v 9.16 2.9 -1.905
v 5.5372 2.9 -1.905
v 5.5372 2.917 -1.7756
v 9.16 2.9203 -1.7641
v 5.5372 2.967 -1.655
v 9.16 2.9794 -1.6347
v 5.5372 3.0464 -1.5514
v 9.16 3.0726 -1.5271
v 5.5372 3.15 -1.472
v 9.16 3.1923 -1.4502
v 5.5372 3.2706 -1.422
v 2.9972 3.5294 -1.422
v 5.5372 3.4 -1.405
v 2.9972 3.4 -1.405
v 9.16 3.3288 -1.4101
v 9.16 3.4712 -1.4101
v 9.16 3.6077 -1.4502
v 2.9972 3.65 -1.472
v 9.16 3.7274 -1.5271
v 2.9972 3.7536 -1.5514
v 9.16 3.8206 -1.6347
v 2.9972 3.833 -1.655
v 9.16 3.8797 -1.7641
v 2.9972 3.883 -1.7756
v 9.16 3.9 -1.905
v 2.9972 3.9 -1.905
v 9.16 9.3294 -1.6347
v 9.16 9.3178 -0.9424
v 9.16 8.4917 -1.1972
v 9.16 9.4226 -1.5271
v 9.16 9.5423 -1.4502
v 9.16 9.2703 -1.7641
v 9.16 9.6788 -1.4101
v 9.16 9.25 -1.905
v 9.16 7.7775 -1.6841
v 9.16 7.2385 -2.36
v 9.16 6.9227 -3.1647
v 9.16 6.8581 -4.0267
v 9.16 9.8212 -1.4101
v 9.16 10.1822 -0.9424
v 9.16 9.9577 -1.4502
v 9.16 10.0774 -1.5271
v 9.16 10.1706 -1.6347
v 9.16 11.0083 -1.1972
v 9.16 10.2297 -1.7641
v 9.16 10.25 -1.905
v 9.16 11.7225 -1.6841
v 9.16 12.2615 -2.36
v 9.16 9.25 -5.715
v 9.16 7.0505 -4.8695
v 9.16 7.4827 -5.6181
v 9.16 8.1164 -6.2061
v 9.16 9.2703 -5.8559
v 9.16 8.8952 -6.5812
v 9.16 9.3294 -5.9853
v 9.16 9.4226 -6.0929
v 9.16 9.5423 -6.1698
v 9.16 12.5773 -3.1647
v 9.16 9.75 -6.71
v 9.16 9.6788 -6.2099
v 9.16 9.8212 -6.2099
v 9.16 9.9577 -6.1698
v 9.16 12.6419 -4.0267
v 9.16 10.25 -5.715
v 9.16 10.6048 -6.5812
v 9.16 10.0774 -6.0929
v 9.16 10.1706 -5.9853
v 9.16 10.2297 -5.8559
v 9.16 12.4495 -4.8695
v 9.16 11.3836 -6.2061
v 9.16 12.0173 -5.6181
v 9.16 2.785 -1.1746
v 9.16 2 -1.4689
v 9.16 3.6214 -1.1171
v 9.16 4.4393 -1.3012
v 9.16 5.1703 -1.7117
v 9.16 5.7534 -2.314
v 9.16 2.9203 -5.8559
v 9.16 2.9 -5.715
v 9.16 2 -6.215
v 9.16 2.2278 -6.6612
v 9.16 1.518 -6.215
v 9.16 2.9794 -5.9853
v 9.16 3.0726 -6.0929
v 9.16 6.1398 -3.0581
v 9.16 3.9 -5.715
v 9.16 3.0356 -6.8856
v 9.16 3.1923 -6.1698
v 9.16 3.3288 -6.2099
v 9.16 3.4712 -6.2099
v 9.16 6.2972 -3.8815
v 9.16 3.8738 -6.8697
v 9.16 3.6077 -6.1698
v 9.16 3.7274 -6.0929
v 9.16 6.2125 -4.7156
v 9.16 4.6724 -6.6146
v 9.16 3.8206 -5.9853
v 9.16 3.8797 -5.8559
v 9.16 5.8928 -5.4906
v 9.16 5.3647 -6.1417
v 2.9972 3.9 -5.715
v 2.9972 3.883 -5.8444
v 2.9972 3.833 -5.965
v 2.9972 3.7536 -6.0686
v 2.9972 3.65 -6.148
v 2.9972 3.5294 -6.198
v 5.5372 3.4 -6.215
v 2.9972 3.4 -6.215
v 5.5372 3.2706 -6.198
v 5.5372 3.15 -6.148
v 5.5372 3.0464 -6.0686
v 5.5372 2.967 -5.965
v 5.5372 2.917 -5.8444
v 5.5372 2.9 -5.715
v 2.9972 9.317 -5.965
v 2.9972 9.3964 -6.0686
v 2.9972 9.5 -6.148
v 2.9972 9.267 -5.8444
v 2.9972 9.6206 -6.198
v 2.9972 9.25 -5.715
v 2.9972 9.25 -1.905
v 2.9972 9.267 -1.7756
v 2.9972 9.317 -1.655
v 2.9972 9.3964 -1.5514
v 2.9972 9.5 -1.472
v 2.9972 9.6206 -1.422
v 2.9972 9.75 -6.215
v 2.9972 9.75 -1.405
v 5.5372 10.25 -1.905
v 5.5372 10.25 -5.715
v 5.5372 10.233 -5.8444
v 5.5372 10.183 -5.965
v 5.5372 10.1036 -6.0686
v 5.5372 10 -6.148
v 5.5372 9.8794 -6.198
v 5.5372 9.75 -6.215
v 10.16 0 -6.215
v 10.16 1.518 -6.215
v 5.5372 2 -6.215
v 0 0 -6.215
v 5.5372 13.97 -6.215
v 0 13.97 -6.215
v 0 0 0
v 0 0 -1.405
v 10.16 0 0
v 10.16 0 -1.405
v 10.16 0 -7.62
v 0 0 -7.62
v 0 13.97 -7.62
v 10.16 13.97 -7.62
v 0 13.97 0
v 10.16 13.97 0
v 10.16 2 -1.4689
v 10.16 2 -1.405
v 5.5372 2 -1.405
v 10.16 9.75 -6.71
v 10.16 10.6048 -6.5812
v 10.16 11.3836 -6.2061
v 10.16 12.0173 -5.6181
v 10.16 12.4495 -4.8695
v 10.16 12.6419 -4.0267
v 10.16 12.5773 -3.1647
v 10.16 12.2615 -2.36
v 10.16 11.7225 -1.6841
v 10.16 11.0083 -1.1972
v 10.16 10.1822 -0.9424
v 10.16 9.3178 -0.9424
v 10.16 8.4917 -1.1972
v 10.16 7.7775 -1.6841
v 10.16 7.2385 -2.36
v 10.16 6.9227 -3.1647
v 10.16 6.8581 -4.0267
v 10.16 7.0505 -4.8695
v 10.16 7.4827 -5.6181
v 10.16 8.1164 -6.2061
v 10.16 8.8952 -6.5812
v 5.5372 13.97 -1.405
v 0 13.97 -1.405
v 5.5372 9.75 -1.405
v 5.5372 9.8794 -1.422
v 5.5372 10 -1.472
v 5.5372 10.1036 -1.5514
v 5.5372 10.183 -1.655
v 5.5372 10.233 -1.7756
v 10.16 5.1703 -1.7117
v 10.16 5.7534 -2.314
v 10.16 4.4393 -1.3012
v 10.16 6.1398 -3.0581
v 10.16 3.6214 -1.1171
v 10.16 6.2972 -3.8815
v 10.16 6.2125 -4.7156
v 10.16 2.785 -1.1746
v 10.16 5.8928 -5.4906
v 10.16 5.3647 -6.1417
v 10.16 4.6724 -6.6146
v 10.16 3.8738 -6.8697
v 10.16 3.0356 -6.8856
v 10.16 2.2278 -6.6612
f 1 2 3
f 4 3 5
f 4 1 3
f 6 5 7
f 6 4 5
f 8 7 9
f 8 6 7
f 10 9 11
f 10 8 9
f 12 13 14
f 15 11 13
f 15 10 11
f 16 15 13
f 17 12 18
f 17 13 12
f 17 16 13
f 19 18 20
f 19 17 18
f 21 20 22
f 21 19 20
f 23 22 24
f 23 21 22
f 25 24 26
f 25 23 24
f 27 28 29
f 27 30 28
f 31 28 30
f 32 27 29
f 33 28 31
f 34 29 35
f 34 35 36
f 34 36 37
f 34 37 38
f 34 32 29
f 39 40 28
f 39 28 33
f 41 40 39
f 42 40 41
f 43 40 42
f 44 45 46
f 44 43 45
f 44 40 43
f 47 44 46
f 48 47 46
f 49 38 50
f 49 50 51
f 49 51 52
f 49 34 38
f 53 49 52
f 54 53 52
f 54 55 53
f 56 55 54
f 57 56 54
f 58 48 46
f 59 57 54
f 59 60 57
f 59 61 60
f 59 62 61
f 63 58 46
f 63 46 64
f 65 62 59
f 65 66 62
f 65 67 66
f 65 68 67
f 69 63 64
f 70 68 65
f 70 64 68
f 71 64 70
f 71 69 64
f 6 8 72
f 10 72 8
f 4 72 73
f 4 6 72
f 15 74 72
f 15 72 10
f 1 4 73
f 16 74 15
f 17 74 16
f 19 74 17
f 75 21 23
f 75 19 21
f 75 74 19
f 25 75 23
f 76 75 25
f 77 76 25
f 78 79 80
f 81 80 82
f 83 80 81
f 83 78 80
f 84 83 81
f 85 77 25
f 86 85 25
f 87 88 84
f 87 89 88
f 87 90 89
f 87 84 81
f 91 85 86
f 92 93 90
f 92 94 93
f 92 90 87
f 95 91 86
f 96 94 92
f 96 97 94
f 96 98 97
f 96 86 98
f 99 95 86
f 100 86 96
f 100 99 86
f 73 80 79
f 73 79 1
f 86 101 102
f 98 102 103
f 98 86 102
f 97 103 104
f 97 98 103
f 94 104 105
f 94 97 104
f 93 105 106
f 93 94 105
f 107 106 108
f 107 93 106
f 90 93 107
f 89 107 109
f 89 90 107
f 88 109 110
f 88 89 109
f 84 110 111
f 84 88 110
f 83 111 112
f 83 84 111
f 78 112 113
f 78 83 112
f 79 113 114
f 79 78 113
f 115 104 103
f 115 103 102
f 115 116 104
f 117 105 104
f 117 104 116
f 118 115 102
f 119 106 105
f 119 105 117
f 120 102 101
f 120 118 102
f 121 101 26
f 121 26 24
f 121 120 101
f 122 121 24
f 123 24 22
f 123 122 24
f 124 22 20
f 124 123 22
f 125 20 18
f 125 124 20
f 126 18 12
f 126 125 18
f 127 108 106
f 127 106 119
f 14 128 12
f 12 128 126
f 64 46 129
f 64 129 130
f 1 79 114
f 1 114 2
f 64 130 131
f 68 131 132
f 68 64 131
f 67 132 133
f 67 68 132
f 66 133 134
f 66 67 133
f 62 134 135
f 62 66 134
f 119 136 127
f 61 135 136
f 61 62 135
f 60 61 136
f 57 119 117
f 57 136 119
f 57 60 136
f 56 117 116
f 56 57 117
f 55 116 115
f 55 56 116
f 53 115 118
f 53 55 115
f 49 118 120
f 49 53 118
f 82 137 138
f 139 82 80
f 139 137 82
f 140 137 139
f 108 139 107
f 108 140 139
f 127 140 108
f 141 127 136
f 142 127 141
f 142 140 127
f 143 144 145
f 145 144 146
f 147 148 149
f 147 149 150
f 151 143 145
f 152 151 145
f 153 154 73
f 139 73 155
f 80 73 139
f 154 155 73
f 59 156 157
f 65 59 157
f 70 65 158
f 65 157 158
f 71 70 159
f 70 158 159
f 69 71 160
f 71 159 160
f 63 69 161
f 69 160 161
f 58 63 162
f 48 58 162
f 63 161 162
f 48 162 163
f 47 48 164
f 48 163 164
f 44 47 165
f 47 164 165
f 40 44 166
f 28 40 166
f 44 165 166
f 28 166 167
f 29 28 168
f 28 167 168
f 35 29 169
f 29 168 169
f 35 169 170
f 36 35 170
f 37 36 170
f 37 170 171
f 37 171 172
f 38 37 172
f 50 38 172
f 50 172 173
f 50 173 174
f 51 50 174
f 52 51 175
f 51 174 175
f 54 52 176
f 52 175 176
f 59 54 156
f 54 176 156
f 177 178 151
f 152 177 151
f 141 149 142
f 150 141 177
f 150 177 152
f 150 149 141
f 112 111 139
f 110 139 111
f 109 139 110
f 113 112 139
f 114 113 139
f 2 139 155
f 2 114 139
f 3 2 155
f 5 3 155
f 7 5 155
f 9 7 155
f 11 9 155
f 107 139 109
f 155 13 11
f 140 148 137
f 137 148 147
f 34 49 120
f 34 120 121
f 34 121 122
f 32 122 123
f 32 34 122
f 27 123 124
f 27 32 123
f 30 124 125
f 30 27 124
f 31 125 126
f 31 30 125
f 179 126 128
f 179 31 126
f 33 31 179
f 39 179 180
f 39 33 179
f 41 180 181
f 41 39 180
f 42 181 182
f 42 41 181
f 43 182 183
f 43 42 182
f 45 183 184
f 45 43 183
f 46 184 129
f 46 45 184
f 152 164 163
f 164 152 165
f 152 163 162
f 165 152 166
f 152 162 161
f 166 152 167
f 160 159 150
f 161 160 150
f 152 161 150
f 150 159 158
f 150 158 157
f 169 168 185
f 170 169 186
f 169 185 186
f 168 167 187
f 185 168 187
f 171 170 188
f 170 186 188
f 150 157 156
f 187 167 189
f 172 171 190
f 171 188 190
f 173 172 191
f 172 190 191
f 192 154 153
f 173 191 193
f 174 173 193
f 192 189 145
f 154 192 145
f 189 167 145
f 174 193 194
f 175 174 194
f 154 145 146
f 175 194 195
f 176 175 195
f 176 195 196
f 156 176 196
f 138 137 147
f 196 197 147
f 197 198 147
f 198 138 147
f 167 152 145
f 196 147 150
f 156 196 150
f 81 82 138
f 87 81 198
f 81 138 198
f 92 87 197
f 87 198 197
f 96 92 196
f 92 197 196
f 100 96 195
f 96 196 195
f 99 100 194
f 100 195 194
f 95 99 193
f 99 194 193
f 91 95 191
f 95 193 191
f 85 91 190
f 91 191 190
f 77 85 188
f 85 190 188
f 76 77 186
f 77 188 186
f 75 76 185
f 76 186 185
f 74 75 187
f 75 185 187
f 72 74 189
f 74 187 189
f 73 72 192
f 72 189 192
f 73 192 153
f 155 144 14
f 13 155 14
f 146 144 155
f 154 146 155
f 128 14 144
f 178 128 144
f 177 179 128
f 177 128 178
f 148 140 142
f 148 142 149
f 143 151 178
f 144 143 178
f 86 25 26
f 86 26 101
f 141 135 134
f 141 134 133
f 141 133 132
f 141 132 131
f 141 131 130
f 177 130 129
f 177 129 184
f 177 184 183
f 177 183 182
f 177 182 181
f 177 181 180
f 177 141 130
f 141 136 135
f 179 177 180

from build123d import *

# Parameters (mm, degrees)
SKETCH1_W           = 10.16
SKETCH1_H           = 7.62
BOSS_EXTRUDE1_DEPTH = 13.97
SKETCH2_R           = 2.9
CUT_EXTRUDE1_DEPTH  = 1
CUT_EXTRUDE2_REACH  = 20.88
SKETCH3_W           = 4.81
SKETCH3_H           = 2
SKETCH5_W           = 4.81
SKETCH5_H           = 4.22
CUT_EXTRUDE4_DEPTH  = 5.5372
SKETCH6_W           = 4.81
SKETCH6_H           = 10.57
CUT_EXTRUDE6_DEPTH  = 2.9972
SKETCH7_W           = 4.81
SKETCH7_H           = 3.4
CUT_EXTRUDE7_DEPTH  = 5.5372


with BuildPart() as part:
    # Sketch1 → Boss-Extrude1 (new body)
    with BuildSketch(Plane(origin=(0, 0, 0), x_dir=(1, 0, 0), z_dir=(0, 1, 0))):
        with Locations((5.08, 3.81)):
            Rectangle(SKETCH1_W, SKETCH1_H)
    extrude(amount=BOSS_EXTRUDE1_DEPTH)

    # Sketch2 → Cut-Extrude1 (cut)
    with BuildSketch(Plane(origin=(10.16, 0, 0), x_dir=(0, 0, -1), z_dir=(1, 0, 0))):
        with Locations((4.008616611, 3.4)):
            Circle(SKETCH2_R)
        with Locations((3.81, 9.75)):
            Circle(SKETCH2_R)
    extrude(amount=-CUT_EXTRUDE1_DEPTH, mode=Mode.SUBTRACT)

    # Sketch3 → Cut-Extrude2 (cut, up to next)
    with BuildSketch(Plane(origin=(10.16, 0, 0), x_dir=(0, 0, -1), z_dir=(1, 0, 0)), mode=Mode.PRIVATE) as cut_extrude2_sk1:
        with BuildLine():
            Line((1.905, 3.9), (5.715, 3.9))
            ThreePointArc((5.715, 3.9), (6.215, 3.4), (5.715, 2.9))
            Line((5.715, 2.9), (1.905, 2.9))
            ThreePointArc((1.905, 2.9), (1.405, 3.4), (1.905, 3.9))
        make_face()
    cut_extrude2_tool1 = extrude(cut_extrude2_sk1.sketch, amount=-CUT_EXTRUDE2_REACH, mode=Mode.PRIVATE) & part.part
    # Sketch3 → Cut-Extrude2 (cut, up to next)
    with BuildSketch(Plane(origin=(10.16, 0, 0), x_dir=(0, 0, -1), z_dir=(1, 0, 0)), mode=Mode.PRIVATE) as cut_extrude2_sk2:
        with BuildLine():
            Line((1.905, 10.25), (5.715, 10.25))
            ThreePointArc((5.715, 10.25), (6.215, 9.75), (5.715, 9.25))
            Line((5.715, 9.25), (1.905, 9.25))
            ThreePointArc((1.905, 9.25), (1.405, 9.75), (1.905, 10.25))
        make_face()
    cut_extrude2_tool2 = extrude(cut_extrude2_sk2.sketch, amount=-CUT_EXTRUDE2_REACH, mode=Mode.PRIVATE) & part.part
    # Sketch3 → Cut-Extrude2 (cut, up to next)
    with BuildSketch(Plane(origin=(10.16, 0, 0), x_dir=(0, 0, -1), z_dir=(1, 0, 0)), mode=Mode.PRIVATE) as cut_extrude2_sk3:
        with Locations((3.81, 1)):
            Rectangle(SKETCH3_W, SKETCH3_H)
    cut_extrude2_tool3 = extrude(cut_extrude2_sk3.sketch, amount=-CUT_EXTRUDE2_REACH, mode=Mode.PRIVATE) & part.part
    add(cut_extrude2_tool1.solids().sort_by_distance((10.16, 3.4, -3.81))[0], mode=Mode.SUBTRACT)
    add(cut_extrude2_tool2.solids().sort_by_distance((10.16, 9.75, -3.81))[0], mode=Mode.SUBTRACT)
    add(cut_extrude2_tool3.solids().sort_by_distance((10.16, 1, -3.81))[0], mode=Mode.SUBTRACT)

    # Sketch5 → Cut-Extrude4 (cut)
    with BuildSketch(Plane.ZY):
        with Locations((-3.81, 11.86)):
            Rectangle(SKETCH5_W, SKETCH5_H)
    extrude(amount=-CUT_EXTRUDE4_DEPTH, mode=Mode.SUBTRACT)

    # Sketch6 → Cut-Extrude6 (cut)
    with BuildSketch(Plane.ZY):
        with Locations((-3.81, 8.685)):
            Rectangle(SKETCH6_W, SKETCH6_H)
    extrude(amount=-CUT_EXTRUDE6_DEPTH, mode=Mode.SUBTRACT)

    # Sketch7 → Cut-Extrude7 (cut)
    with BuildSketch(Plane.ZY):
        with Locations((-3.81, 1.7)):
            Rectangle(SKETCH7_W, SKETCH7_H)
    extrude(amount=-CUT_EXTRUDE7_DEPTH, mode=Mode.SUBTRACT)


solid = part.part
